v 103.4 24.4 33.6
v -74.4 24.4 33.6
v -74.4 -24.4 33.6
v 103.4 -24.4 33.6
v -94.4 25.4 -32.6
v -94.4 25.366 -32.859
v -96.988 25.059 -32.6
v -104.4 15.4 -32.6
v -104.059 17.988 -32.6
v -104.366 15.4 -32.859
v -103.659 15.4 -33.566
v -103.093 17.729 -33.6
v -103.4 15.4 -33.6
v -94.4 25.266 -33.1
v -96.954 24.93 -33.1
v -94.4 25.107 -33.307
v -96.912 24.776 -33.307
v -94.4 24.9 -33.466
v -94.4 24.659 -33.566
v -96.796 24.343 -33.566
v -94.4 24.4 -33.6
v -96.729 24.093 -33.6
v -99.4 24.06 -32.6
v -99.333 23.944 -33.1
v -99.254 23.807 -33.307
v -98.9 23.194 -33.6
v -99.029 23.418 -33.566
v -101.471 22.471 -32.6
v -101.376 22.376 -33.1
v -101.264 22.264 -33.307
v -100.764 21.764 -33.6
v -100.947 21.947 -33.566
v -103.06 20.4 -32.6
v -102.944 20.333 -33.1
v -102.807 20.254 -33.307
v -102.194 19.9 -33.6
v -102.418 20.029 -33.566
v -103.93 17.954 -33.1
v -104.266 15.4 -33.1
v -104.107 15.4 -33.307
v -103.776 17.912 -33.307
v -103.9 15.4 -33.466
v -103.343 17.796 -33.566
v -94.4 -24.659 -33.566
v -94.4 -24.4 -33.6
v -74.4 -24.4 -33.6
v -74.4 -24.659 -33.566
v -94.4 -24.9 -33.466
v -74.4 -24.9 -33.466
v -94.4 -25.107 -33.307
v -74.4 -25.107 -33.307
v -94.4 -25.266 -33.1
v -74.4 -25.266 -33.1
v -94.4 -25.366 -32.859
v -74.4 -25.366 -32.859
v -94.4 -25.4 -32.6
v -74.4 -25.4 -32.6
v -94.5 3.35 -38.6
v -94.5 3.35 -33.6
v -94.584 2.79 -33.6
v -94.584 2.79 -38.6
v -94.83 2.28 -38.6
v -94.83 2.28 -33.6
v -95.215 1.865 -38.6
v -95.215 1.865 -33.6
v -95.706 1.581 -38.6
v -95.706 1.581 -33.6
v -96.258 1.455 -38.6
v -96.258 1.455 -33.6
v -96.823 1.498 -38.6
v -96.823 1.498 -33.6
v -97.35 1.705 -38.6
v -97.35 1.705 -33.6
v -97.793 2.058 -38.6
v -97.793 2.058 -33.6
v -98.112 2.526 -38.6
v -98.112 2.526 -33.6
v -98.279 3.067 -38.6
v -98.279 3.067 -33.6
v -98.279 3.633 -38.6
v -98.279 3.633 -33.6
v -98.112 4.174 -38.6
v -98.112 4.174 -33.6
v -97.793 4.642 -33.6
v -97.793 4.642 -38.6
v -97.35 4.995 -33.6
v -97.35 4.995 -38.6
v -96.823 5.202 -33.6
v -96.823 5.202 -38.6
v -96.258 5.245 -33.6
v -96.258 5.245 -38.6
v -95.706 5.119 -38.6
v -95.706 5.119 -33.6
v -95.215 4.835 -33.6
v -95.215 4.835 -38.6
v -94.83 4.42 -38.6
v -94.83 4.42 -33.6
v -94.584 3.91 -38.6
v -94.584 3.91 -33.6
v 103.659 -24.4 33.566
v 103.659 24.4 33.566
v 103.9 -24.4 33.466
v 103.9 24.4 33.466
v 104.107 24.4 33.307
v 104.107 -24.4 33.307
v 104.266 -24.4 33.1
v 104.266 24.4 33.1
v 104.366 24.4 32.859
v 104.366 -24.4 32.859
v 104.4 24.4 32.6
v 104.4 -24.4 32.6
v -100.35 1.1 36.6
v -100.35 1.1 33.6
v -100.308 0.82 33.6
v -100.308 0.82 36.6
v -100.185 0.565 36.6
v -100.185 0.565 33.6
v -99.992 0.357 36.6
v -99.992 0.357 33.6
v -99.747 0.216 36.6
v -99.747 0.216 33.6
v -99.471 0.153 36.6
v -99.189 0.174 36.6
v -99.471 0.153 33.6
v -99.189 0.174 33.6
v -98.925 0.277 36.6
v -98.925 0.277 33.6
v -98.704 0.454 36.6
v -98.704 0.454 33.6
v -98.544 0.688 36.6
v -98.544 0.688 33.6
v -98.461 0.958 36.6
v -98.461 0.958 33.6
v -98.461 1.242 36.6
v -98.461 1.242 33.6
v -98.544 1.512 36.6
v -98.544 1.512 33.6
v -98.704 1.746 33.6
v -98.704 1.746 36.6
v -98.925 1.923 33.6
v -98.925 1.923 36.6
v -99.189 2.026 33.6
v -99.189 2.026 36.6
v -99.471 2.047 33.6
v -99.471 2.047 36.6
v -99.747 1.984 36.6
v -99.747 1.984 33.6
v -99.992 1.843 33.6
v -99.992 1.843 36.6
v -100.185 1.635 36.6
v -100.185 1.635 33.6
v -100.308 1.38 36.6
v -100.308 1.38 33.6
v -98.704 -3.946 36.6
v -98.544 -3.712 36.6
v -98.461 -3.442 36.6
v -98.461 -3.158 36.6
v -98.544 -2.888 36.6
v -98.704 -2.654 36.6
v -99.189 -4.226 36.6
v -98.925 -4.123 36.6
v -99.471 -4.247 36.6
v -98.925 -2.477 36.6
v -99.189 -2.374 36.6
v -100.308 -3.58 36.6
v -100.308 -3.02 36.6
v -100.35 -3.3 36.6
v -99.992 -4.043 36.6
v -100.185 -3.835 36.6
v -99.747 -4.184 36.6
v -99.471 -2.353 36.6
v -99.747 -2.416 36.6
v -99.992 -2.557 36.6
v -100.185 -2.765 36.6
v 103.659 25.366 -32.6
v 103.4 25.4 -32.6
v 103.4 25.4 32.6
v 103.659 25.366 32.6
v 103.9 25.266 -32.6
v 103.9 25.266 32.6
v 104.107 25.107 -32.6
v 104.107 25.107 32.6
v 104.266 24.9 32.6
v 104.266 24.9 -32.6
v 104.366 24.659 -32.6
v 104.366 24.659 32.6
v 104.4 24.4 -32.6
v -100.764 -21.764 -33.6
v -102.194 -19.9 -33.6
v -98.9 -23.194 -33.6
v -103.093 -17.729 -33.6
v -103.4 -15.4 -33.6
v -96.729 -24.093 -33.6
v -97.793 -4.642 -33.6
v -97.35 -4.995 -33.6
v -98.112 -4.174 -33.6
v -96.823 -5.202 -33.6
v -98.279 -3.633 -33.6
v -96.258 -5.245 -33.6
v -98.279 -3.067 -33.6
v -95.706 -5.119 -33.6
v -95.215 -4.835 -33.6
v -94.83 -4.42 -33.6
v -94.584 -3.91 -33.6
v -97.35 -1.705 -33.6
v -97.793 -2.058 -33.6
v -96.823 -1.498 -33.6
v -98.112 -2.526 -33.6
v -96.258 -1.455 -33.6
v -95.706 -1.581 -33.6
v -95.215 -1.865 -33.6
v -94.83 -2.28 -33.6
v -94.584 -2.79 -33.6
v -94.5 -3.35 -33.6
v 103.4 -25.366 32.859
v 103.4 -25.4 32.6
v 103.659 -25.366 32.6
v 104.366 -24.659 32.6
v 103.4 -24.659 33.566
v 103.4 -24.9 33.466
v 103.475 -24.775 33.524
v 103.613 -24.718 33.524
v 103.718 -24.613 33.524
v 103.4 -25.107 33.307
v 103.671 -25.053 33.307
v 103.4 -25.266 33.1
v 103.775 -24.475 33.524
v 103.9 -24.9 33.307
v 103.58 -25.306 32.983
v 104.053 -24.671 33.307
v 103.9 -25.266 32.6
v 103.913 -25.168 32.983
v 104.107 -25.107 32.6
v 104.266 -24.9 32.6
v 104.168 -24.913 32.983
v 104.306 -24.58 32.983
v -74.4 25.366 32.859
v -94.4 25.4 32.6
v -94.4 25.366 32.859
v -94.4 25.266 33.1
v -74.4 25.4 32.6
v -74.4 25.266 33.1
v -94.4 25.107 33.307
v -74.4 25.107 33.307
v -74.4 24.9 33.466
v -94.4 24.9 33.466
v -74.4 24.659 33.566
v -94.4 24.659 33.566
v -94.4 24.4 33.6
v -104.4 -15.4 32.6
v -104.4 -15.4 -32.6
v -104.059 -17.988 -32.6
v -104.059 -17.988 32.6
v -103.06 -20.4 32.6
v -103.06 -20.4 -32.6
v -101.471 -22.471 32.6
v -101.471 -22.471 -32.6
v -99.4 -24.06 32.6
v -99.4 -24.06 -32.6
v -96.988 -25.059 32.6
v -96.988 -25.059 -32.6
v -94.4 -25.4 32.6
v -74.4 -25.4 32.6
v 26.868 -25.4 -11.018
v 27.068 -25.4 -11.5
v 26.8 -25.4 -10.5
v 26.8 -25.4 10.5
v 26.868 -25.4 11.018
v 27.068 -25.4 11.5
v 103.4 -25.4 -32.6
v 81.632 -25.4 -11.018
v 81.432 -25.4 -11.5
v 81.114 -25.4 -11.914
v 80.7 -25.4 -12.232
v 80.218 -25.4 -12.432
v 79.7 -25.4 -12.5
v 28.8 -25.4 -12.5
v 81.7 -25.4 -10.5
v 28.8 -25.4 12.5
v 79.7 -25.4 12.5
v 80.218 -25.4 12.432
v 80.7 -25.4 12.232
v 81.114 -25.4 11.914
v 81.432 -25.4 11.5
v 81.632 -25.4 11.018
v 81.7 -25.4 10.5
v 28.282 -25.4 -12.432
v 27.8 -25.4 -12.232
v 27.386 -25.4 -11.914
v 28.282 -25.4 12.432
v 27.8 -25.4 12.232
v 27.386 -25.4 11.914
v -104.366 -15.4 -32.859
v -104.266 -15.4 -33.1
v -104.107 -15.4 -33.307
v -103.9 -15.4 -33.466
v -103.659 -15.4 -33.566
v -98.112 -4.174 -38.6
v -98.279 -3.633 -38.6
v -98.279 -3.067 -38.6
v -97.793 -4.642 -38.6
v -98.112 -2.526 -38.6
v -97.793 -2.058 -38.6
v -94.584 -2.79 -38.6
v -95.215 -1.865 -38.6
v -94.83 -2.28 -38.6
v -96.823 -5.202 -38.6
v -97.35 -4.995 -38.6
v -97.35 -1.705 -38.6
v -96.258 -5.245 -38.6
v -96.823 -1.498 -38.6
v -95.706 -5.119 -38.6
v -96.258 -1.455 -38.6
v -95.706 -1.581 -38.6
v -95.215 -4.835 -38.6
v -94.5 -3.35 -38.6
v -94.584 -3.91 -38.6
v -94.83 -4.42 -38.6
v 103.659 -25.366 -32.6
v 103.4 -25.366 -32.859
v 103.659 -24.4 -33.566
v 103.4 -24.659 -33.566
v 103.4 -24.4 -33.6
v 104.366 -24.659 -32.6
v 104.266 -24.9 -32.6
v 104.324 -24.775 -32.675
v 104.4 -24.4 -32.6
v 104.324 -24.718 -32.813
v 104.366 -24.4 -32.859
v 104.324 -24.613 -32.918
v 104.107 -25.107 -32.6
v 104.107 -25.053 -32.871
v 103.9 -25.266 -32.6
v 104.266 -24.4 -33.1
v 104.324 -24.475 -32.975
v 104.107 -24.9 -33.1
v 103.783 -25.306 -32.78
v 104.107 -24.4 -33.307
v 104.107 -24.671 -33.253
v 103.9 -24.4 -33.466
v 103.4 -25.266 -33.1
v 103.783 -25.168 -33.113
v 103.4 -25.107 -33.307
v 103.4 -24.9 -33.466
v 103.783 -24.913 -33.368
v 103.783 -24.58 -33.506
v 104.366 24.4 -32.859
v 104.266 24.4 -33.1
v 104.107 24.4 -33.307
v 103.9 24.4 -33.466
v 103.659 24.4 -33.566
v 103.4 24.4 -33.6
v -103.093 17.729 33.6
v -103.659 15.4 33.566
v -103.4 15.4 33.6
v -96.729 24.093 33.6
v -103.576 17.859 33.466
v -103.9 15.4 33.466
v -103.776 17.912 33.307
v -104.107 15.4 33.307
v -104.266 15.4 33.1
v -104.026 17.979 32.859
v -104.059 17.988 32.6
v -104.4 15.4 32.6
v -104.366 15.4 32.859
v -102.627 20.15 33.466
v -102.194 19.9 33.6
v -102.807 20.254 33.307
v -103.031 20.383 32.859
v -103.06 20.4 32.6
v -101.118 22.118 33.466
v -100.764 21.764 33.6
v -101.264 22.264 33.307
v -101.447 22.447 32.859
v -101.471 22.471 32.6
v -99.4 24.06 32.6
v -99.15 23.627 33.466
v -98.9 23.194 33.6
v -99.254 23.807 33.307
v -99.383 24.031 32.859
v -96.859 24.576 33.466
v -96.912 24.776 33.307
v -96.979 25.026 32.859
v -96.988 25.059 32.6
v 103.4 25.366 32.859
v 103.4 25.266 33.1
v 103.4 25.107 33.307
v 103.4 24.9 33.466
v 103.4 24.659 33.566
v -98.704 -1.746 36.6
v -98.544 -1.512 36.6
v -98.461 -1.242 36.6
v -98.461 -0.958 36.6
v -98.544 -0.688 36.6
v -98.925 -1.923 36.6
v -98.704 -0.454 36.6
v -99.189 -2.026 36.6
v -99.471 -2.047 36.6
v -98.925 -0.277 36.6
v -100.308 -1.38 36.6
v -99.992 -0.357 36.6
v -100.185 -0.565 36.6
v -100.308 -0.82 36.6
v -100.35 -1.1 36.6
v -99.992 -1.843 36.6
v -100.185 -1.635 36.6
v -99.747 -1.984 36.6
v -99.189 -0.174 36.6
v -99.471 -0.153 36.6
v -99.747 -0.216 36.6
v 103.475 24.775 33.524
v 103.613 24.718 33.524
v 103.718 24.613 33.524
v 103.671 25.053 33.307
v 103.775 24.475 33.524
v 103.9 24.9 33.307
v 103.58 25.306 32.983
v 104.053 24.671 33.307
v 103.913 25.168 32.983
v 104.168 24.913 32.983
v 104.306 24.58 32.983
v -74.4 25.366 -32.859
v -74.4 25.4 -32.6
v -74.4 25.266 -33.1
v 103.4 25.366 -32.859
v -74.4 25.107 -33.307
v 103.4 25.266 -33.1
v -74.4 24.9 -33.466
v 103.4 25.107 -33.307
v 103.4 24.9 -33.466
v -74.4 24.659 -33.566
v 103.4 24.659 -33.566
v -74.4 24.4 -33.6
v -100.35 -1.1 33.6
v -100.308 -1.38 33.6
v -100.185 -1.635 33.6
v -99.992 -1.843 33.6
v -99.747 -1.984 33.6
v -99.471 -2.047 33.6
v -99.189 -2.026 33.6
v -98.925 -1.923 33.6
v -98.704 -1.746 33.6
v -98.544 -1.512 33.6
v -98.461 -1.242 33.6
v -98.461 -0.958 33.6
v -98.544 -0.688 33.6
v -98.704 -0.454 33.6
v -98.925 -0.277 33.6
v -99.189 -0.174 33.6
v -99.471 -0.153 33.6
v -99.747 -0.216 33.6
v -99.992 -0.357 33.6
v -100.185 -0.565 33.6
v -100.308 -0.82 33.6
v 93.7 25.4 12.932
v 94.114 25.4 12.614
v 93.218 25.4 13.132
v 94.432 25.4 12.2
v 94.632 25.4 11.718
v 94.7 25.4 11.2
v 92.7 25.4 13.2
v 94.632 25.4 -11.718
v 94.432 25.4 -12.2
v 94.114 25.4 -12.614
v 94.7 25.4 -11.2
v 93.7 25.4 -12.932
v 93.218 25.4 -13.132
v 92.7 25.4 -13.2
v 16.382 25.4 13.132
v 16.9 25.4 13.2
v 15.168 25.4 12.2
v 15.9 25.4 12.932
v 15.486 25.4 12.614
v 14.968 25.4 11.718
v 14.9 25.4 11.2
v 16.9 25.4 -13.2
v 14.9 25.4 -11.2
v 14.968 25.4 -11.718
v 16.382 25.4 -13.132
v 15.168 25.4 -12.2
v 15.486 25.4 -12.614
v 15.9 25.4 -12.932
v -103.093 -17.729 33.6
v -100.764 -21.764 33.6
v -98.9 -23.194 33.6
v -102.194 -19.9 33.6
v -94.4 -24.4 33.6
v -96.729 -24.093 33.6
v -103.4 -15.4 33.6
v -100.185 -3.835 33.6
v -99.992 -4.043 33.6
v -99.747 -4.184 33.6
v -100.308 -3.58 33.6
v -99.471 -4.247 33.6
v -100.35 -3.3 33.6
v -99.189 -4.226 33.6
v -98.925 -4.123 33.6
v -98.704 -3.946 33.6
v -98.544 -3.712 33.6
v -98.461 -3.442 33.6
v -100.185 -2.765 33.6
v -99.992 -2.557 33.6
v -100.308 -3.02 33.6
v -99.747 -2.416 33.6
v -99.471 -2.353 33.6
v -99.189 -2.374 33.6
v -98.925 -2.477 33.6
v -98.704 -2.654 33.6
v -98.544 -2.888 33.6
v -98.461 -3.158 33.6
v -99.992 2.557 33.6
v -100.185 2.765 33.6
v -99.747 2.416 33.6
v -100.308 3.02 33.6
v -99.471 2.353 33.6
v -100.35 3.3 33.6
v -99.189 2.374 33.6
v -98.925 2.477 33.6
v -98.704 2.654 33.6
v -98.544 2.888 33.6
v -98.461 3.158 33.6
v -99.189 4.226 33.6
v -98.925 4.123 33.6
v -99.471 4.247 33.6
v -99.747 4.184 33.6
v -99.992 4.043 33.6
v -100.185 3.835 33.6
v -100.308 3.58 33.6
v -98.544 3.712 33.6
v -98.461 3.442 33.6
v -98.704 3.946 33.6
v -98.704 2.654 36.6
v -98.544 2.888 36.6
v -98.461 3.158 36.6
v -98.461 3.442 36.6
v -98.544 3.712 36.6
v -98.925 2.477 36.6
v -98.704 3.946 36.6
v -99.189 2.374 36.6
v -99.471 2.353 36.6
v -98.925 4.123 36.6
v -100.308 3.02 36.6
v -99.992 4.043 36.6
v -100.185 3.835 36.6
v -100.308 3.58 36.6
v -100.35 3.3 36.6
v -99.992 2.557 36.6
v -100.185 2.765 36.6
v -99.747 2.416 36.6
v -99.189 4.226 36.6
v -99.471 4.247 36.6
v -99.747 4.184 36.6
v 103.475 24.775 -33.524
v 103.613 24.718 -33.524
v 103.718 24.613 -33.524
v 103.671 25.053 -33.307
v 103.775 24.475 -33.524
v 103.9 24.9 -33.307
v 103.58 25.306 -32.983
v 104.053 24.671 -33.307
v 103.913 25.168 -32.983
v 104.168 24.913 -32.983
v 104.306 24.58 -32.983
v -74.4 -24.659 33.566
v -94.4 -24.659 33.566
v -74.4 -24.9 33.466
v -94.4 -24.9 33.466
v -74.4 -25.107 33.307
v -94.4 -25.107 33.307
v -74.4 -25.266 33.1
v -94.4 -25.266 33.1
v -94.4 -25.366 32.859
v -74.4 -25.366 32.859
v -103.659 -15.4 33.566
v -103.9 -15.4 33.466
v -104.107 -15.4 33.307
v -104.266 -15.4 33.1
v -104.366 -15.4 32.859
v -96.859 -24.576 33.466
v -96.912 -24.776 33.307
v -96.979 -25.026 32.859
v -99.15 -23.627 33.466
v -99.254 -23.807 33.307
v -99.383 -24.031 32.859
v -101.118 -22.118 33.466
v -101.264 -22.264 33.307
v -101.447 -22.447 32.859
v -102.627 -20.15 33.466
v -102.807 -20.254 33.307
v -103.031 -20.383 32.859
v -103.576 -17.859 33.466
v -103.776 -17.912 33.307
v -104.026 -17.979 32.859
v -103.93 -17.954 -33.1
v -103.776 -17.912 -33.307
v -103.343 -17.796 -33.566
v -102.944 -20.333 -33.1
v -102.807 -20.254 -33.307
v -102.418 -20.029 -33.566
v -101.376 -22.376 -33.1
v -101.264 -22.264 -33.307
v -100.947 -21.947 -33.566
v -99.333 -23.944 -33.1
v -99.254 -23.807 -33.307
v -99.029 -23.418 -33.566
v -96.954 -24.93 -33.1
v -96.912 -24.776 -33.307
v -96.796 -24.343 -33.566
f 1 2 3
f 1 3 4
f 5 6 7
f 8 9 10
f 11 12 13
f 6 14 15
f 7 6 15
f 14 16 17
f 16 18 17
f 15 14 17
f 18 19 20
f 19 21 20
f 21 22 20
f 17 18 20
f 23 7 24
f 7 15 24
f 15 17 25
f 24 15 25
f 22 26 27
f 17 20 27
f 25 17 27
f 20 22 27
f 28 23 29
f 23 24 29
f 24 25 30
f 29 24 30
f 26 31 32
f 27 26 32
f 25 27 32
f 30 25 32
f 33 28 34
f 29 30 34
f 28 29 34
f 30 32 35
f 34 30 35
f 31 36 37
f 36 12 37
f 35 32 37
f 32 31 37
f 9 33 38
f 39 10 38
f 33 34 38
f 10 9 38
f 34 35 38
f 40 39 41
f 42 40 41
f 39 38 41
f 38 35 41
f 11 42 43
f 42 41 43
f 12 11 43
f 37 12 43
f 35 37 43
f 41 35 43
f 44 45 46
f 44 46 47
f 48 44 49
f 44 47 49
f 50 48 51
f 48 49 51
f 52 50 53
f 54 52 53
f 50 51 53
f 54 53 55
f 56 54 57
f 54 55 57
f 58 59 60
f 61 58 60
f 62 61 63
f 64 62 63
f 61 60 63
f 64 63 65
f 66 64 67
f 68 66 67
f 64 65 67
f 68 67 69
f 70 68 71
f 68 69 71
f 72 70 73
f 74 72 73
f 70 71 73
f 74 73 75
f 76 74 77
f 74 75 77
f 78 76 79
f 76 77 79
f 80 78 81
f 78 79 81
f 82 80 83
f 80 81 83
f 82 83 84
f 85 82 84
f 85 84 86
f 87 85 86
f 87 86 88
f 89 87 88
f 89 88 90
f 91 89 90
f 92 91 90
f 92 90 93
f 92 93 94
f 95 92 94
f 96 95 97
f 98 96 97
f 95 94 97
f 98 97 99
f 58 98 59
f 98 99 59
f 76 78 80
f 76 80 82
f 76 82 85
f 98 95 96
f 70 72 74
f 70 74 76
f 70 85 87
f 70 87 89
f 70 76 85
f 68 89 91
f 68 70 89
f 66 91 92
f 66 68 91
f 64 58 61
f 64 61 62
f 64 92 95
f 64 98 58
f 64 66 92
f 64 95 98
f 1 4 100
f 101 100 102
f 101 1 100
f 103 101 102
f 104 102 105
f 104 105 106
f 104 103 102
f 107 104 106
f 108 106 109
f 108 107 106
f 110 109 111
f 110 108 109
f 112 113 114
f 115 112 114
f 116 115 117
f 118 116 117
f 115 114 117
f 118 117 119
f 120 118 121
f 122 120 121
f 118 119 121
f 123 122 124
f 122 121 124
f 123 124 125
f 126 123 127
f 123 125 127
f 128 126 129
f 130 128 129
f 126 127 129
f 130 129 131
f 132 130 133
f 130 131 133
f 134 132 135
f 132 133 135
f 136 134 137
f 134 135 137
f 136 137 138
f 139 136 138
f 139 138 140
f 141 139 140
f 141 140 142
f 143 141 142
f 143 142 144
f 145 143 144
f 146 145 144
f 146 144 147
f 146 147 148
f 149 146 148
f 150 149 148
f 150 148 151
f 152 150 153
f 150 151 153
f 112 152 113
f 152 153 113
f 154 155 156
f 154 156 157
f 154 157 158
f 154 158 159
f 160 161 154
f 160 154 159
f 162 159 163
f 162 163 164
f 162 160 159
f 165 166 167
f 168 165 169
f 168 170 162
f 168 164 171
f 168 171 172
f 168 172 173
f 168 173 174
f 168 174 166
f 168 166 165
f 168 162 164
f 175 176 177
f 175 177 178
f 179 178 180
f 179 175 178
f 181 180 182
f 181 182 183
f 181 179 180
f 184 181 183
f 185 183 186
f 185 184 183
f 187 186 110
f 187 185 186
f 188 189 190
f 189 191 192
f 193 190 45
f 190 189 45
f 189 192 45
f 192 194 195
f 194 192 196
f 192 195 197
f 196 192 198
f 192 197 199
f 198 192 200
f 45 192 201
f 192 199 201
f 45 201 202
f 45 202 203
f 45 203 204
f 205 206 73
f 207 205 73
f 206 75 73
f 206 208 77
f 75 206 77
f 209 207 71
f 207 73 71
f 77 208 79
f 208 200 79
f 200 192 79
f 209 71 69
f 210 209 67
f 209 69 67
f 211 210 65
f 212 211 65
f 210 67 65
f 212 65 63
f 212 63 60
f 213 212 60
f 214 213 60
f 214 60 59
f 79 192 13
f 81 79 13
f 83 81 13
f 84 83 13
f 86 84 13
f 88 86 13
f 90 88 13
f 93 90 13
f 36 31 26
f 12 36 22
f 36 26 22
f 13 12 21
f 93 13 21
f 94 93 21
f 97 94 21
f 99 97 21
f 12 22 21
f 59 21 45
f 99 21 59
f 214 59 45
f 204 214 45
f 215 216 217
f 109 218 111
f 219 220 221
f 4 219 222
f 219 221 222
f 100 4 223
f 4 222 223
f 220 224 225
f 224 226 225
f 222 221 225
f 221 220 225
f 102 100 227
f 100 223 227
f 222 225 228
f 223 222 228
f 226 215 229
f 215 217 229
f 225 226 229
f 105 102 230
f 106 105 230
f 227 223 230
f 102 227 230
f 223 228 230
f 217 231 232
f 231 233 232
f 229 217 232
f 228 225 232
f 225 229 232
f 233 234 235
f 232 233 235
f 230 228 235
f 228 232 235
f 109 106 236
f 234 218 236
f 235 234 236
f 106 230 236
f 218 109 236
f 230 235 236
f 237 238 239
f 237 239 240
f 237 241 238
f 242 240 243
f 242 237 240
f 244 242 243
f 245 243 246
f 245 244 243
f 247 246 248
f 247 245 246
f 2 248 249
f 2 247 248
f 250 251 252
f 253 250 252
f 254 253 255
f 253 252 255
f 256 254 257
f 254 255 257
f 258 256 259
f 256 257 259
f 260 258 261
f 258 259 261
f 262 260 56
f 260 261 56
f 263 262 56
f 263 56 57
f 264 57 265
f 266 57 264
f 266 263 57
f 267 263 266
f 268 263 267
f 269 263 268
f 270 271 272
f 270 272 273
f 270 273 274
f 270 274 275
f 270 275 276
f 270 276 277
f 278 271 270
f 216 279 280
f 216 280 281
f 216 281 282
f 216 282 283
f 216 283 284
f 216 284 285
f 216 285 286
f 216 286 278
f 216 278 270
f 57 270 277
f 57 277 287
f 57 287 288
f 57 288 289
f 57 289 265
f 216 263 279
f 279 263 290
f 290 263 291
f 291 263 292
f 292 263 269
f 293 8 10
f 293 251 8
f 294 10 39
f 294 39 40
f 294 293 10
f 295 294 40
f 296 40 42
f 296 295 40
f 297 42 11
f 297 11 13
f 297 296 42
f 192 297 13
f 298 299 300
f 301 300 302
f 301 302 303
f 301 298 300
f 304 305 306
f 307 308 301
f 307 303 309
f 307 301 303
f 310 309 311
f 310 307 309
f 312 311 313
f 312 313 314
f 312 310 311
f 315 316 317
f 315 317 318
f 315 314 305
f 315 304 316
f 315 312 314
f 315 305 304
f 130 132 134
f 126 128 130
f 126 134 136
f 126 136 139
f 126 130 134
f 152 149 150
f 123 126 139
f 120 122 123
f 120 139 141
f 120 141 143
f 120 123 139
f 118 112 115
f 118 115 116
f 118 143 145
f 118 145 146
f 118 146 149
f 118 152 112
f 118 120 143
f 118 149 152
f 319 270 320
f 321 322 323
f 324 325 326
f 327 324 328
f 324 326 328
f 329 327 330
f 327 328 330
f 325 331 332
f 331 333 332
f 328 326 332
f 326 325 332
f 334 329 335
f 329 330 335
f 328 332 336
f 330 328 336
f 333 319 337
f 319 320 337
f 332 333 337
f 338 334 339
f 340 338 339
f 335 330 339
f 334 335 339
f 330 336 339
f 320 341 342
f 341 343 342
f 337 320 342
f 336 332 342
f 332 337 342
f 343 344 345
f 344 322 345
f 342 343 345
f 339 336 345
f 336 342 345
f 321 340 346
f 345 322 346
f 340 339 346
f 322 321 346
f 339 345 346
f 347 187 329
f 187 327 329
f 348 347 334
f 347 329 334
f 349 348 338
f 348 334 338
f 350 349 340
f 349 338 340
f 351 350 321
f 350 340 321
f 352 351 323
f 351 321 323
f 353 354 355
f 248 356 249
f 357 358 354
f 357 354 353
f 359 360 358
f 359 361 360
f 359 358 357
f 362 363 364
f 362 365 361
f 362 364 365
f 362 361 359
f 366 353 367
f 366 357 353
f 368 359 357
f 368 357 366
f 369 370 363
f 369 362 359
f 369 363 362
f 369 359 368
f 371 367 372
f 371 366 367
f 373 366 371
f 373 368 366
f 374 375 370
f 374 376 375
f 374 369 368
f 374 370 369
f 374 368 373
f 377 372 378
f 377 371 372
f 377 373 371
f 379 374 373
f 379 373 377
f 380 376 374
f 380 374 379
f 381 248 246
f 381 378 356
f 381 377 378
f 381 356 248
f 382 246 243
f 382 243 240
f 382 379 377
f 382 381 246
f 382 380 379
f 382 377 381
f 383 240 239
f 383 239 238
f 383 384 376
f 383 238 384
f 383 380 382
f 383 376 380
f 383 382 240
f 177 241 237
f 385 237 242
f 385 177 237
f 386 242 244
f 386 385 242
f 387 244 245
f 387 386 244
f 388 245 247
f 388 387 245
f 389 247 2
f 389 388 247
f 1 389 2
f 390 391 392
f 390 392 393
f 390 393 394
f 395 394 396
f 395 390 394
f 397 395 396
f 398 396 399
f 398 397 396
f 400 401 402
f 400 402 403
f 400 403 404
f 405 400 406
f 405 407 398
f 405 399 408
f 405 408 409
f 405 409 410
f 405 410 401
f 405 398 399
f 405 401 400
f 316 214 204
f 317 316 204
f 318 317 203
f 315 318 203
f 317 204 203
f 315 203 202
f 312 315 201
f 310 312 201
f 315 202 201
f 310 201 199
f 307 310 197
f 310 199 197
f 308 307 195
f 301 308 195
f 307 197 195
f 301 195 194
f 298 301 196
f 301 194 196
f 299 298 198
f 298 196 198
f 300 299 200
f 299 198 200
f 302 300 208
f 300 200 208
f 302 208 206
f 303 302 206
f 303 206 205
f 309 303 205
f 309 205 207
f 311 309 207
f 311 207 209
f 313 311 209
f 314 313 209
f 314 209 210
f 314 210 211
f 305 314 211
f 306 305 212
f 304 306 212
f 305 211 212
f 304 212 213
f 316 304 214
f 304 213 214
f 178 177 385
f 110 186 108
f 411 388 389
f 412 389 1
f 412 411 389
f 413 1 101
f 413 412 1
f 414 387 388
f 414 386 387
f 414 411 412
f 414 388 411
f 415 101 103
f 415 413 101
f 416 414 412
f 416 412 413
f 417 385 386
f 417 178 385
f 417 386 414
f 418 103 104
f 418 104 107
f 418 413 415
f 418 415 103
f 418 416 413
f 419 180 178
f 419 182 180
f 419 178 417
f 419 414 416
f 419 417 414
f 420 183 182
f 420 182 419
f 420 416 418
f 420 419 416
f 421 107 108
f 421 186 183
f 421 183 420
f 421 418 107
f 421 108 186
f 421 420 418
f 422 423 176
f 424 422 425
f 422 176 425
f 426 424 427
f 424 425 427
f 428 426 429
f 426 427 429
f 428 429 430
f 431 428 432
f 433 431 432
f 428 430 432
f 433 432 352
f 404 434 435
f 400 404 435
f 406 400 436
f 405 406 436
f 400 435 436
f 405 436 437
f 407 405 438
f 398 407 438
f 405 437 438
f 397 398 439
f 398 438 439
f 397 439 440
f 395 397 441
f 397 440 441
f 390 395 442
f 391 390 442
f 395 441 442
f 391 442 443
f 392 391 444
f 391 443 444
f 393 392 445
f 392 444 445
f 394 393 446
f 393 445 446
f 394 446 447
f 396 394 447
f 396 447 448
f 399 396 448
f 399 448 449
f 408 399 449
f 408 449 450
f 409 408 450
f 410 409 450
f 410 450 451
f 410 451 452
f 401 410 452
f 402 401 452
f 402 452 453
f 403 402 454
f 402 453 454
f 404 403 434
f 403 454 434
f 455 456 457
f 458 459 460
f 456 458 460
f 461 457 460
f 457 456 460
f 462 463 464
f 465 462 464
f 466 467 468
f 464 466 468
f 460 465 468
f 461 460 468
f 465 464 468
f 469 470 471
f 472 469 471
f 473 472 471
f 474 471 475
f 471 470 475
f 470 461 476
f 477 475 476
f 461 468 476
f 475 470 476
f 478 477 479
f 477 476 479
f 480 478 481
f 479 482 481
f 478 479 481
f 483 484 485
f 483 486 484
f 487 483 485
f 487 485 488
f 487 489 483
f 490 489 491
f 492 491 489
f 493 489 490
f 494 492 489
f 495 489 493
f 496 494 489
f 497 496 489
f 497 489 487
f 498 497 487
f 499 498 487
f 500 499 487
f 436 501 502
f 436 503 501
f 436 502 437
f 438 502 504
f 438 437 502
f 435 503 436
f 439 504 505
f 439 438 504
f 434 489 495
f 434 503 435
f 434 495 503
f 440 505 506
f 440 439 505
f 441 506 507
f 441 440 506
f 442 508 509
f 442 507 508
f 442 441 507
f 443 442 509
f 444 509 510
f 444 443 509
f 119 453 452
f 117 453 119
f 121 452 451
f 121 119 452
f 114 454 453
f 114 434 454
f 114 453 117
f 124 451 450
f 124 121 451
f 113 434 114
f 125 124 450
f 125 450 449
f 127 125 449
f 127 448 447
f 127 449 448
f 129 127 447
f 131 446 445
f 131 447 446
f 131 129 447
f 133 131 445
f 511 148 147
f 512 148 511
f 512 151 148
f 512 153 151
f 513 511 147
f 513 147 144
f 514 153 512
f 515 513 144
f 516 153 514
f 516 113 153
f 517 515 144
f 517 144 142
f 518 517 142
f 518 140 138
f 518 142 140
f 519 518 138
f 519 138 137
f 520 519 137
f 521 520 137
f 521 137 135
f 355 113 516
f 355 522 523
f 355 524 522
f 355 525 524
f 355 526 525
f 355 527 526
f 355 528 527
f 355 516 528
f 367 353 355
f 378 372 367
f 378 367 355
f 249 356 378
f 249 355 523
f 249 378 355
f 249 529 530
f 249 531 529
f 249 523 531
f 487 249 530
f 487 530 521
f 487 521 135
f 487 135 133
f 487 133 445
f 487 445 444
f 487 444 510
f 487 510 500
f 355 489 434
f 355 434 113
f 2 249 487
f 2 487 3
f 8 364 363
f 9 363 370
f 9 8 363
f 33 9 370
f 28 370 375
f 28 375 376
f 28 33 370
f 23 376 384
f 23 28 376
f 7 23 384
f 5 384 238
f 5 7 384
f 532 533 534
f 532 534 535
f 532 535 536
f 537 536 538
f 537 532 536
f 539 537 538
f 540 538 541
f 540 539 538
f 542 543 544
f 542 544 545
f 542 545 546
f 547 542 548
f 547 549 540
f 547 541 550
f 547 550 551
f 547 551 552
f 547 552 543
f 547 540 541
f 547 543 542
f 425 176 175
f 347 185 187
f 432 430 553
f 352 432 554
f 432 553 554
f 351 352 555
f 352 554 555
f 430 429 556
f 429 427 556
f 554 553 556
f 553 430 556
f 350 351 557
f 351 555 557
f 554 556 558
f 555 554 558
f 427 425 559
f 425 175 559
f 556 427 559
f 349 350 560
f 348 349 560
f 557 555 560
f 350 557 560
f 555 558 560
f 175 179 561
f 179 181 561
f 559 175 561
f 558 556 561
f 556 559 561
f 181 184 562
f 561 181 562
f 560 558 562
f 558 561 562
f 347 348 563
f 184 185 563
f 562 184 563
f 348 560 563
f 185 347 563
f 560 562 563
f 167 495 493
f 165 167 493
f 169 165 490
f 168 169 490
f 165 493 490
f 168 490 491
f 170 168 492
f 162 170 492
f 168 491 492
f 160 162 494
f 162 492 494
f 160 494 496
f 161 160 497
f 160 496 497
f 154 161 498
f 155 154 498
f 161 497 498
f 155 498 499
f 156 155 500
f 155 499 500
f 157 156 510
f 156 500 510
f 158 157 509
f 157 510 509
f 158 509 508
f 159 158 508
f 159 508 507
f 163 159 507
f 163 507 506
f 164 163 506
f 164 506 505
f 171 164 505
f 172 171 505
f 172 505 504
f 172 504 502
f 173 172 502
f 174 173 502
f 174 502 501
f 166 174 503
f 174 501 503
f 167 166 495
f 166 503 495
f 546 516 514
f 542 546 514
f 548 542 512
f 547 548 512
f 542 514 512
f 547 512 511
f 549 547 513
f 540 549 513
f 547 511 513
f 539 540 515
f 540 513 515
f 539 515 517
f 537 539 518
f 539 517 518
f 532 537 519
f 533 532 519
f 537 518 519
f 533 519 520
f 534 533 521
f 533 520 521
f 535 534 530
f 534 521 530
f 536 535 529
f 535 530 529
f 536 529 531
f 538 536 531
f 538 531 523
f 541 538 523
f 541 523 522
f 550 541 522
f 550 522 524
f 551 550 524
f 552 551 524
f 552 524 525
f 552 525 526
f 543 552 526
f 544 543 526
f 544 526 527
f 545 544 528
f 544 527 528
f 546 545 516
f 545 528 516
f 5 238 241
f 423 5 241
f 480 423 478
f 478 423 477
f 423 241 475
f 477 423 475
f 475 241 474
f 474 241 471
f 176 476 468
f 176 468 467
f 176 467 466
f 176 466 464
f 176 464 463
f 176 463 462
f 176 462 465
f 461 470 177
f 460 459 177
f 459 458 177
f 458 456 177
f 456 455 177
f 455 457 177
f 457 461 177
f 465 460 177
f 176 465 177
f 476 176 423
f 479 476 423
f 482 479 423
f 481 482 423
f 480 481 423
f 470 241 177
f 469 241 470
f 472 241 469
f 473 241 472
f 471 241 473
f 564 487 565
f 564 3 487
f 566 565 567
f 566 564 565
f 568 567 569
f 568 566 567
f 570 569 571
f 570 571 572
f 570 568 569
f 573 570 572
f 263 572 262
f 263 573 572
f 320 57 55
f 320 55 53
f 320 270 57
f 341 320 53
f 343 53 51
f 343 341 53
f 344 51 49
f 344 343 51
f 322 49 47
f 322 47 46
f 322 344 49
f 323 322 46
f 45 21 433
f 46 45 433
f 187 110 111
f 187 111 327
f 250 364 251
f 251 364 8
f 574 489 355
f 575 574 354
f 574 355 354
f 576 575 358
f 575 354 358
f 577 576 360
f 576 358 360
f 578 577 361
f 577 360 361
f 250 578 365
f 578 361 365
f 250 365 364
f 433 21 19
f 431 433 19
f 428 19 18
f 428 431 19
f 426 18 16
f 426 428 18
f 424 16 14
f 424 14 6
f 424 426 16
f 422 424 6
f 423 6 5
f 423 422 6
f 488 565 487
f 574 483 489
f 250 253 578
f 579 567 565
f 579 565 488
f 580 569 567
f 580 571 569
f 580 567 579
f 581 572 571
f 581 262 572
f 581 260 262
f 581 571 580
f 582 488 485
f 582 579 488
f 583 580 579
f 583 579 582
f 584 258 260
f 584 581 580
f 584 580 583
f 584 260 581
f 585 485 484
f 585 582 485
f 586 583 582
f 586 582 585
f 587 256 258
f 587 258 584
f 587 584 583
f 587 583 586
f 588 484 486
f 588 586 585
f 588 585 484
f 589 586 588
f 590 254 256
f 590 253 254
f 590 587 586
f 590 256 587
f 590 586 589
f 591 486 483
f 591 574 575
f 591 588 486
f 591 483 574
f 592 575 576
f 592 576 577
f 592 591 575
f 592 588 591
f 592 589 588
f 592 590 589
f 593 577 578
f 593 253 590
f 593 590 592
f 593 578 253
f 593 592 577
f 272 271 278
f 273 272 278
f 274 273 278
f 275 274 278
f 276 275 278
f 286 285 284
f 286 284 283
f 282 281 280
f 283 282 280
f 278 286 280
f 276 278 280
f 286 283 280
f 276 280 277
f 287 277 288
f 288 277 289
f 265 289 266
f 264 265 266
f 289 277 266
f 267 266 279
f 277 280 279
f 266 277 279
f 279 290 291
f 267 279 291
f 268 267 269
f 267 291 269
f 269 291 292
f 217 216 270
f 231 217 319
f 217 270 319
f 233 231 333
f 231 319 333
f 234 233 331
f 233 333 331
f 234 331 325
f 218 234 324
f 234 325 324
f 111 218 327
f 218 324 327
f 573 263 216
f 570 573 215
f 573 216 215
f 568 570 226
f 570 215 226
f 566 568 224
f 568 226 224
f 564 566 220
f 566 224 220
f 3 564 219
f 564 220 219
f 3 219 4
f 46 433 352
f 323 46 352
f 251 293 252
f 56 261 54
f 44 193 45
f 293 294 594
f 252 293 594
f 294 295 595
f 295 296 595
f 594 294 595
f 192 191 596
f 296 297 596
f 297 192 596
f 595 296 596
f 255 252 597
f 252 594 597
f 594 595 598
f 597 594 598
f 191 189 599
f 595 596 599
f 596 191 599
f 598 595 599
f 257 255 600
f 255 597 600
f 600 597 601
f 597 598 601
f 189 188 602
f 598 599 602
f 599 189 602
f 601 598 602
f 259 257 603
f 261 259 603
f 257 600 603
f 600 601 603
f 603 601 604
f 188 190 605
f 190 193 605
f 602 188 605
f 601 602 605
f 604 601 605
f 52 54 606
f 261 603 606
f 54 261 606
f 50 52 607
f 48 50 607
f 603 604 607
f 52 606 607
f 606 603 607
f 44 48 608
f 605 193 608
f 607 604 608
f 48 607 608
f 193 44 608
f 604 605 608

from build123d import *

# Parameters (mm, degrees)
SKETCH1_W           = 208.8
SKETCH1_H           = 67.2
BOSS_EXTRUDE1_DEPTH = 25.4
FILLET1_R           = 10
SKETCH2_R           = 1.9
BOSS_EXTRUDE2_DEPTH = 5
SKETCH4_R           = 0.95
BOSS_EXTRUDE3_DEPTH = 3
SKETCH5_W           = 20
SKETCH5_H           = 50.8
BOSS_EXTRUDE4_DEPTH = 0.0001
BOSS_EXTRUDE5_DEPTH = 0.0001
BOSS_EXTRUDE6_DEPTH = 0.0001
FILLET7_R           = 1
FILLET8_R           = 1


with BuildPart() as part:
    # Sketch1 → Boss-Extrude1 (new, symmetric)
    with BuildSketch(Plane(origin=(0, 0, 0), x_dir=(1, 0, 0), z_dir=(0, 1, 0))):
        Rectangle(SKETCH1_W, SKETCH1_H)
    extrude(amount=BOSS_EXTRUDE1_DEPTH, both=True)

    # Fillet1
    fillet1_edges = [part.edges().sort_by_distance(p)[0] for p in [
        (-104.4, 25.4, 0),
        (-104.4, -25.4, 0),
    ]]
    fillet(fillet1_edges, radius=FILLET1_R)

    # Sketch2 → Boss-Extrude2 (add)
    with BuildSketch(Plane(origin=(0, 0, -33.6), x_dir=(-1, 0, 0), z_dir=(0, 0, -1))):
        with Locations(Location((96.4, 3.35, 0), (0, 0, 180))):
            Circle(SKETCH2_R)
        with Locations(Location((96.4, -3.35, 0), (0, 0, 180))):
            Circle(SKETCH2_R)
    extrude(amount=BOSS_EXTRUDE2_DEPTH)

    # Sketch4 → Boss-Extrude3 (add)
    with BuildSketch(Plane.XY.offset(33.6)):
        with Locations(Location((-99.4, 3.3, 0), (0, 0, 180))):
            Circle(SKETCH4_R)
        with Locations(Location((-99.4, 1.1, 0), (0, 0, 180))):
            Circle(SKETCH4_R)
        with Locations(Location((-99.4, -1.1, 0), (0, 0, 180))):
            Circle(SKETCH4_R)
        with Locations(Location((-99.4, -3.3, 0), (0, 0, 180))):
            Circle(SKETCH4_R)
    extrude(amount=BOSS_EXTRUDE3_DEPTH)

    # Sketch5 → Boss-Extrude4 (add)
    with BuildSketch(Plane.XY.offset(33.6)):
        with Locations((-84.4, 0)):
            Rectangle(SKETCH5_W, SKETCH5_H)
    boss_extrude4 = extrude(amount=BOSS_EXTRUDE4_DEPTH)

    # Mirror1: Boss-Extrude4 across plane
    add(boss_extrude4.mirror(Plane.XY))

    # Mirror1 at the second plane: Boss-Extrude4 across plane
    add(boss_extrude4.mirror(Plane.ZX))

    # Sketch6 → Boss-Extrude5 (add)
    with BuildSketch(Plane(origin=(0, 25.4, 0), x_dir=(1, 0, 0), z_dir=(0, 1, 0))):
        with BuildLine():
            Line((16.9, 13.2), (92.7, 13.2))
            ThreePointArc((92.7, 13.2), (94.114213562, 12.614213562), (94.7, 11.2))
            Line((94.7, 11.2), (94.7, -11.2))
            ThreePointArc((94.7, -11.2), (94.114213562, -12.614213562), (92.7, -13.2))
            Line((92.7, -13.2), (16.9, -13.2))
            ThreePointArc((16.9, -13.2), (15.485786438, -12.614213562), (14.9, -11.2))
            Line((14.9, -11.2), (14.9, 11.2))
            ThreePointArc((14.9, 11.2), (15.485786438, 12.614213562), (16.9, 13.2))
        make_face()
    extrude(amount=BOSS_EXTRUDE5_DEPTH)

    # Sketch7 → Boss-Extrude6 (add)
    with BuildSketch(Plane.XZ.offset(25.4)):
        with BuildLine():
            Line((28.8, 12.5), (79.7, 12.5))
            ThreePointArc((79.7, 12.5), (81.114213562, 11.914213562), (81.7, 10.5))
            Line((81.7, 10.5), (81.7, -10.5))
            ThreePointArc((81.7, -10.5), (81.114213562, -11.914213562), (79.7, -12.5))
            Line((79.7, -12.5), (28.8, -12.5))
            ThreePointArc((28.8, -12.5), (27.385786438, -11.914213562), (26.8, -10.5))
            Line((26.8, -10.5), (26.8, 10.5))
            ThreePointArc((26.8, 10.5), (27.385786438, 11.914213562), (28.8, 12.5))
        make_face()
    extrude(amount=BOSS_EXTRUDE6_DEPTH)

    # Fillet7
    fillet7_edges = [part.edges().sort_by_distance(p)[0] for p in [
        (104.4, 25.4, 0),
        (-104.4, 0, 33.6),
        (-104.4, 0, -33.6),
        (15, 25.4, -33.6),
        (-101.471067812, 22.471067812, 33.6),
        (-101.471067812, -22.471067812, 33.6),
        (-101.471067812, 22.471067812, -33.6),
        (-101.471067812, -22.471067812, -33.6),
        (15, -25.4, -33.6),
        (104.4, -25.4, 0),
        (15, -25.4, 33.6),
        (15, 25.4, 33.6),
        (104.4, 0, -33.6),
        (104.4, 0, 33.6),
    ]]
    fillet(fillet7_edges, radius=FILLET7_R)

    # Fillet8
    fillet8_edges = [part.edges().sort_by_distance(p)[0] for p in [
        (-84.4, -25.4, 33.6001),
        (-84.4, 25.4, 33.6001),
        (-84.4, 25.4, -33.6001),
        (-84.4, -25.4, -33.6001),
    ]]
    fillet(fillet8_edges, radius=FILLET8_R)


solid = part.part
